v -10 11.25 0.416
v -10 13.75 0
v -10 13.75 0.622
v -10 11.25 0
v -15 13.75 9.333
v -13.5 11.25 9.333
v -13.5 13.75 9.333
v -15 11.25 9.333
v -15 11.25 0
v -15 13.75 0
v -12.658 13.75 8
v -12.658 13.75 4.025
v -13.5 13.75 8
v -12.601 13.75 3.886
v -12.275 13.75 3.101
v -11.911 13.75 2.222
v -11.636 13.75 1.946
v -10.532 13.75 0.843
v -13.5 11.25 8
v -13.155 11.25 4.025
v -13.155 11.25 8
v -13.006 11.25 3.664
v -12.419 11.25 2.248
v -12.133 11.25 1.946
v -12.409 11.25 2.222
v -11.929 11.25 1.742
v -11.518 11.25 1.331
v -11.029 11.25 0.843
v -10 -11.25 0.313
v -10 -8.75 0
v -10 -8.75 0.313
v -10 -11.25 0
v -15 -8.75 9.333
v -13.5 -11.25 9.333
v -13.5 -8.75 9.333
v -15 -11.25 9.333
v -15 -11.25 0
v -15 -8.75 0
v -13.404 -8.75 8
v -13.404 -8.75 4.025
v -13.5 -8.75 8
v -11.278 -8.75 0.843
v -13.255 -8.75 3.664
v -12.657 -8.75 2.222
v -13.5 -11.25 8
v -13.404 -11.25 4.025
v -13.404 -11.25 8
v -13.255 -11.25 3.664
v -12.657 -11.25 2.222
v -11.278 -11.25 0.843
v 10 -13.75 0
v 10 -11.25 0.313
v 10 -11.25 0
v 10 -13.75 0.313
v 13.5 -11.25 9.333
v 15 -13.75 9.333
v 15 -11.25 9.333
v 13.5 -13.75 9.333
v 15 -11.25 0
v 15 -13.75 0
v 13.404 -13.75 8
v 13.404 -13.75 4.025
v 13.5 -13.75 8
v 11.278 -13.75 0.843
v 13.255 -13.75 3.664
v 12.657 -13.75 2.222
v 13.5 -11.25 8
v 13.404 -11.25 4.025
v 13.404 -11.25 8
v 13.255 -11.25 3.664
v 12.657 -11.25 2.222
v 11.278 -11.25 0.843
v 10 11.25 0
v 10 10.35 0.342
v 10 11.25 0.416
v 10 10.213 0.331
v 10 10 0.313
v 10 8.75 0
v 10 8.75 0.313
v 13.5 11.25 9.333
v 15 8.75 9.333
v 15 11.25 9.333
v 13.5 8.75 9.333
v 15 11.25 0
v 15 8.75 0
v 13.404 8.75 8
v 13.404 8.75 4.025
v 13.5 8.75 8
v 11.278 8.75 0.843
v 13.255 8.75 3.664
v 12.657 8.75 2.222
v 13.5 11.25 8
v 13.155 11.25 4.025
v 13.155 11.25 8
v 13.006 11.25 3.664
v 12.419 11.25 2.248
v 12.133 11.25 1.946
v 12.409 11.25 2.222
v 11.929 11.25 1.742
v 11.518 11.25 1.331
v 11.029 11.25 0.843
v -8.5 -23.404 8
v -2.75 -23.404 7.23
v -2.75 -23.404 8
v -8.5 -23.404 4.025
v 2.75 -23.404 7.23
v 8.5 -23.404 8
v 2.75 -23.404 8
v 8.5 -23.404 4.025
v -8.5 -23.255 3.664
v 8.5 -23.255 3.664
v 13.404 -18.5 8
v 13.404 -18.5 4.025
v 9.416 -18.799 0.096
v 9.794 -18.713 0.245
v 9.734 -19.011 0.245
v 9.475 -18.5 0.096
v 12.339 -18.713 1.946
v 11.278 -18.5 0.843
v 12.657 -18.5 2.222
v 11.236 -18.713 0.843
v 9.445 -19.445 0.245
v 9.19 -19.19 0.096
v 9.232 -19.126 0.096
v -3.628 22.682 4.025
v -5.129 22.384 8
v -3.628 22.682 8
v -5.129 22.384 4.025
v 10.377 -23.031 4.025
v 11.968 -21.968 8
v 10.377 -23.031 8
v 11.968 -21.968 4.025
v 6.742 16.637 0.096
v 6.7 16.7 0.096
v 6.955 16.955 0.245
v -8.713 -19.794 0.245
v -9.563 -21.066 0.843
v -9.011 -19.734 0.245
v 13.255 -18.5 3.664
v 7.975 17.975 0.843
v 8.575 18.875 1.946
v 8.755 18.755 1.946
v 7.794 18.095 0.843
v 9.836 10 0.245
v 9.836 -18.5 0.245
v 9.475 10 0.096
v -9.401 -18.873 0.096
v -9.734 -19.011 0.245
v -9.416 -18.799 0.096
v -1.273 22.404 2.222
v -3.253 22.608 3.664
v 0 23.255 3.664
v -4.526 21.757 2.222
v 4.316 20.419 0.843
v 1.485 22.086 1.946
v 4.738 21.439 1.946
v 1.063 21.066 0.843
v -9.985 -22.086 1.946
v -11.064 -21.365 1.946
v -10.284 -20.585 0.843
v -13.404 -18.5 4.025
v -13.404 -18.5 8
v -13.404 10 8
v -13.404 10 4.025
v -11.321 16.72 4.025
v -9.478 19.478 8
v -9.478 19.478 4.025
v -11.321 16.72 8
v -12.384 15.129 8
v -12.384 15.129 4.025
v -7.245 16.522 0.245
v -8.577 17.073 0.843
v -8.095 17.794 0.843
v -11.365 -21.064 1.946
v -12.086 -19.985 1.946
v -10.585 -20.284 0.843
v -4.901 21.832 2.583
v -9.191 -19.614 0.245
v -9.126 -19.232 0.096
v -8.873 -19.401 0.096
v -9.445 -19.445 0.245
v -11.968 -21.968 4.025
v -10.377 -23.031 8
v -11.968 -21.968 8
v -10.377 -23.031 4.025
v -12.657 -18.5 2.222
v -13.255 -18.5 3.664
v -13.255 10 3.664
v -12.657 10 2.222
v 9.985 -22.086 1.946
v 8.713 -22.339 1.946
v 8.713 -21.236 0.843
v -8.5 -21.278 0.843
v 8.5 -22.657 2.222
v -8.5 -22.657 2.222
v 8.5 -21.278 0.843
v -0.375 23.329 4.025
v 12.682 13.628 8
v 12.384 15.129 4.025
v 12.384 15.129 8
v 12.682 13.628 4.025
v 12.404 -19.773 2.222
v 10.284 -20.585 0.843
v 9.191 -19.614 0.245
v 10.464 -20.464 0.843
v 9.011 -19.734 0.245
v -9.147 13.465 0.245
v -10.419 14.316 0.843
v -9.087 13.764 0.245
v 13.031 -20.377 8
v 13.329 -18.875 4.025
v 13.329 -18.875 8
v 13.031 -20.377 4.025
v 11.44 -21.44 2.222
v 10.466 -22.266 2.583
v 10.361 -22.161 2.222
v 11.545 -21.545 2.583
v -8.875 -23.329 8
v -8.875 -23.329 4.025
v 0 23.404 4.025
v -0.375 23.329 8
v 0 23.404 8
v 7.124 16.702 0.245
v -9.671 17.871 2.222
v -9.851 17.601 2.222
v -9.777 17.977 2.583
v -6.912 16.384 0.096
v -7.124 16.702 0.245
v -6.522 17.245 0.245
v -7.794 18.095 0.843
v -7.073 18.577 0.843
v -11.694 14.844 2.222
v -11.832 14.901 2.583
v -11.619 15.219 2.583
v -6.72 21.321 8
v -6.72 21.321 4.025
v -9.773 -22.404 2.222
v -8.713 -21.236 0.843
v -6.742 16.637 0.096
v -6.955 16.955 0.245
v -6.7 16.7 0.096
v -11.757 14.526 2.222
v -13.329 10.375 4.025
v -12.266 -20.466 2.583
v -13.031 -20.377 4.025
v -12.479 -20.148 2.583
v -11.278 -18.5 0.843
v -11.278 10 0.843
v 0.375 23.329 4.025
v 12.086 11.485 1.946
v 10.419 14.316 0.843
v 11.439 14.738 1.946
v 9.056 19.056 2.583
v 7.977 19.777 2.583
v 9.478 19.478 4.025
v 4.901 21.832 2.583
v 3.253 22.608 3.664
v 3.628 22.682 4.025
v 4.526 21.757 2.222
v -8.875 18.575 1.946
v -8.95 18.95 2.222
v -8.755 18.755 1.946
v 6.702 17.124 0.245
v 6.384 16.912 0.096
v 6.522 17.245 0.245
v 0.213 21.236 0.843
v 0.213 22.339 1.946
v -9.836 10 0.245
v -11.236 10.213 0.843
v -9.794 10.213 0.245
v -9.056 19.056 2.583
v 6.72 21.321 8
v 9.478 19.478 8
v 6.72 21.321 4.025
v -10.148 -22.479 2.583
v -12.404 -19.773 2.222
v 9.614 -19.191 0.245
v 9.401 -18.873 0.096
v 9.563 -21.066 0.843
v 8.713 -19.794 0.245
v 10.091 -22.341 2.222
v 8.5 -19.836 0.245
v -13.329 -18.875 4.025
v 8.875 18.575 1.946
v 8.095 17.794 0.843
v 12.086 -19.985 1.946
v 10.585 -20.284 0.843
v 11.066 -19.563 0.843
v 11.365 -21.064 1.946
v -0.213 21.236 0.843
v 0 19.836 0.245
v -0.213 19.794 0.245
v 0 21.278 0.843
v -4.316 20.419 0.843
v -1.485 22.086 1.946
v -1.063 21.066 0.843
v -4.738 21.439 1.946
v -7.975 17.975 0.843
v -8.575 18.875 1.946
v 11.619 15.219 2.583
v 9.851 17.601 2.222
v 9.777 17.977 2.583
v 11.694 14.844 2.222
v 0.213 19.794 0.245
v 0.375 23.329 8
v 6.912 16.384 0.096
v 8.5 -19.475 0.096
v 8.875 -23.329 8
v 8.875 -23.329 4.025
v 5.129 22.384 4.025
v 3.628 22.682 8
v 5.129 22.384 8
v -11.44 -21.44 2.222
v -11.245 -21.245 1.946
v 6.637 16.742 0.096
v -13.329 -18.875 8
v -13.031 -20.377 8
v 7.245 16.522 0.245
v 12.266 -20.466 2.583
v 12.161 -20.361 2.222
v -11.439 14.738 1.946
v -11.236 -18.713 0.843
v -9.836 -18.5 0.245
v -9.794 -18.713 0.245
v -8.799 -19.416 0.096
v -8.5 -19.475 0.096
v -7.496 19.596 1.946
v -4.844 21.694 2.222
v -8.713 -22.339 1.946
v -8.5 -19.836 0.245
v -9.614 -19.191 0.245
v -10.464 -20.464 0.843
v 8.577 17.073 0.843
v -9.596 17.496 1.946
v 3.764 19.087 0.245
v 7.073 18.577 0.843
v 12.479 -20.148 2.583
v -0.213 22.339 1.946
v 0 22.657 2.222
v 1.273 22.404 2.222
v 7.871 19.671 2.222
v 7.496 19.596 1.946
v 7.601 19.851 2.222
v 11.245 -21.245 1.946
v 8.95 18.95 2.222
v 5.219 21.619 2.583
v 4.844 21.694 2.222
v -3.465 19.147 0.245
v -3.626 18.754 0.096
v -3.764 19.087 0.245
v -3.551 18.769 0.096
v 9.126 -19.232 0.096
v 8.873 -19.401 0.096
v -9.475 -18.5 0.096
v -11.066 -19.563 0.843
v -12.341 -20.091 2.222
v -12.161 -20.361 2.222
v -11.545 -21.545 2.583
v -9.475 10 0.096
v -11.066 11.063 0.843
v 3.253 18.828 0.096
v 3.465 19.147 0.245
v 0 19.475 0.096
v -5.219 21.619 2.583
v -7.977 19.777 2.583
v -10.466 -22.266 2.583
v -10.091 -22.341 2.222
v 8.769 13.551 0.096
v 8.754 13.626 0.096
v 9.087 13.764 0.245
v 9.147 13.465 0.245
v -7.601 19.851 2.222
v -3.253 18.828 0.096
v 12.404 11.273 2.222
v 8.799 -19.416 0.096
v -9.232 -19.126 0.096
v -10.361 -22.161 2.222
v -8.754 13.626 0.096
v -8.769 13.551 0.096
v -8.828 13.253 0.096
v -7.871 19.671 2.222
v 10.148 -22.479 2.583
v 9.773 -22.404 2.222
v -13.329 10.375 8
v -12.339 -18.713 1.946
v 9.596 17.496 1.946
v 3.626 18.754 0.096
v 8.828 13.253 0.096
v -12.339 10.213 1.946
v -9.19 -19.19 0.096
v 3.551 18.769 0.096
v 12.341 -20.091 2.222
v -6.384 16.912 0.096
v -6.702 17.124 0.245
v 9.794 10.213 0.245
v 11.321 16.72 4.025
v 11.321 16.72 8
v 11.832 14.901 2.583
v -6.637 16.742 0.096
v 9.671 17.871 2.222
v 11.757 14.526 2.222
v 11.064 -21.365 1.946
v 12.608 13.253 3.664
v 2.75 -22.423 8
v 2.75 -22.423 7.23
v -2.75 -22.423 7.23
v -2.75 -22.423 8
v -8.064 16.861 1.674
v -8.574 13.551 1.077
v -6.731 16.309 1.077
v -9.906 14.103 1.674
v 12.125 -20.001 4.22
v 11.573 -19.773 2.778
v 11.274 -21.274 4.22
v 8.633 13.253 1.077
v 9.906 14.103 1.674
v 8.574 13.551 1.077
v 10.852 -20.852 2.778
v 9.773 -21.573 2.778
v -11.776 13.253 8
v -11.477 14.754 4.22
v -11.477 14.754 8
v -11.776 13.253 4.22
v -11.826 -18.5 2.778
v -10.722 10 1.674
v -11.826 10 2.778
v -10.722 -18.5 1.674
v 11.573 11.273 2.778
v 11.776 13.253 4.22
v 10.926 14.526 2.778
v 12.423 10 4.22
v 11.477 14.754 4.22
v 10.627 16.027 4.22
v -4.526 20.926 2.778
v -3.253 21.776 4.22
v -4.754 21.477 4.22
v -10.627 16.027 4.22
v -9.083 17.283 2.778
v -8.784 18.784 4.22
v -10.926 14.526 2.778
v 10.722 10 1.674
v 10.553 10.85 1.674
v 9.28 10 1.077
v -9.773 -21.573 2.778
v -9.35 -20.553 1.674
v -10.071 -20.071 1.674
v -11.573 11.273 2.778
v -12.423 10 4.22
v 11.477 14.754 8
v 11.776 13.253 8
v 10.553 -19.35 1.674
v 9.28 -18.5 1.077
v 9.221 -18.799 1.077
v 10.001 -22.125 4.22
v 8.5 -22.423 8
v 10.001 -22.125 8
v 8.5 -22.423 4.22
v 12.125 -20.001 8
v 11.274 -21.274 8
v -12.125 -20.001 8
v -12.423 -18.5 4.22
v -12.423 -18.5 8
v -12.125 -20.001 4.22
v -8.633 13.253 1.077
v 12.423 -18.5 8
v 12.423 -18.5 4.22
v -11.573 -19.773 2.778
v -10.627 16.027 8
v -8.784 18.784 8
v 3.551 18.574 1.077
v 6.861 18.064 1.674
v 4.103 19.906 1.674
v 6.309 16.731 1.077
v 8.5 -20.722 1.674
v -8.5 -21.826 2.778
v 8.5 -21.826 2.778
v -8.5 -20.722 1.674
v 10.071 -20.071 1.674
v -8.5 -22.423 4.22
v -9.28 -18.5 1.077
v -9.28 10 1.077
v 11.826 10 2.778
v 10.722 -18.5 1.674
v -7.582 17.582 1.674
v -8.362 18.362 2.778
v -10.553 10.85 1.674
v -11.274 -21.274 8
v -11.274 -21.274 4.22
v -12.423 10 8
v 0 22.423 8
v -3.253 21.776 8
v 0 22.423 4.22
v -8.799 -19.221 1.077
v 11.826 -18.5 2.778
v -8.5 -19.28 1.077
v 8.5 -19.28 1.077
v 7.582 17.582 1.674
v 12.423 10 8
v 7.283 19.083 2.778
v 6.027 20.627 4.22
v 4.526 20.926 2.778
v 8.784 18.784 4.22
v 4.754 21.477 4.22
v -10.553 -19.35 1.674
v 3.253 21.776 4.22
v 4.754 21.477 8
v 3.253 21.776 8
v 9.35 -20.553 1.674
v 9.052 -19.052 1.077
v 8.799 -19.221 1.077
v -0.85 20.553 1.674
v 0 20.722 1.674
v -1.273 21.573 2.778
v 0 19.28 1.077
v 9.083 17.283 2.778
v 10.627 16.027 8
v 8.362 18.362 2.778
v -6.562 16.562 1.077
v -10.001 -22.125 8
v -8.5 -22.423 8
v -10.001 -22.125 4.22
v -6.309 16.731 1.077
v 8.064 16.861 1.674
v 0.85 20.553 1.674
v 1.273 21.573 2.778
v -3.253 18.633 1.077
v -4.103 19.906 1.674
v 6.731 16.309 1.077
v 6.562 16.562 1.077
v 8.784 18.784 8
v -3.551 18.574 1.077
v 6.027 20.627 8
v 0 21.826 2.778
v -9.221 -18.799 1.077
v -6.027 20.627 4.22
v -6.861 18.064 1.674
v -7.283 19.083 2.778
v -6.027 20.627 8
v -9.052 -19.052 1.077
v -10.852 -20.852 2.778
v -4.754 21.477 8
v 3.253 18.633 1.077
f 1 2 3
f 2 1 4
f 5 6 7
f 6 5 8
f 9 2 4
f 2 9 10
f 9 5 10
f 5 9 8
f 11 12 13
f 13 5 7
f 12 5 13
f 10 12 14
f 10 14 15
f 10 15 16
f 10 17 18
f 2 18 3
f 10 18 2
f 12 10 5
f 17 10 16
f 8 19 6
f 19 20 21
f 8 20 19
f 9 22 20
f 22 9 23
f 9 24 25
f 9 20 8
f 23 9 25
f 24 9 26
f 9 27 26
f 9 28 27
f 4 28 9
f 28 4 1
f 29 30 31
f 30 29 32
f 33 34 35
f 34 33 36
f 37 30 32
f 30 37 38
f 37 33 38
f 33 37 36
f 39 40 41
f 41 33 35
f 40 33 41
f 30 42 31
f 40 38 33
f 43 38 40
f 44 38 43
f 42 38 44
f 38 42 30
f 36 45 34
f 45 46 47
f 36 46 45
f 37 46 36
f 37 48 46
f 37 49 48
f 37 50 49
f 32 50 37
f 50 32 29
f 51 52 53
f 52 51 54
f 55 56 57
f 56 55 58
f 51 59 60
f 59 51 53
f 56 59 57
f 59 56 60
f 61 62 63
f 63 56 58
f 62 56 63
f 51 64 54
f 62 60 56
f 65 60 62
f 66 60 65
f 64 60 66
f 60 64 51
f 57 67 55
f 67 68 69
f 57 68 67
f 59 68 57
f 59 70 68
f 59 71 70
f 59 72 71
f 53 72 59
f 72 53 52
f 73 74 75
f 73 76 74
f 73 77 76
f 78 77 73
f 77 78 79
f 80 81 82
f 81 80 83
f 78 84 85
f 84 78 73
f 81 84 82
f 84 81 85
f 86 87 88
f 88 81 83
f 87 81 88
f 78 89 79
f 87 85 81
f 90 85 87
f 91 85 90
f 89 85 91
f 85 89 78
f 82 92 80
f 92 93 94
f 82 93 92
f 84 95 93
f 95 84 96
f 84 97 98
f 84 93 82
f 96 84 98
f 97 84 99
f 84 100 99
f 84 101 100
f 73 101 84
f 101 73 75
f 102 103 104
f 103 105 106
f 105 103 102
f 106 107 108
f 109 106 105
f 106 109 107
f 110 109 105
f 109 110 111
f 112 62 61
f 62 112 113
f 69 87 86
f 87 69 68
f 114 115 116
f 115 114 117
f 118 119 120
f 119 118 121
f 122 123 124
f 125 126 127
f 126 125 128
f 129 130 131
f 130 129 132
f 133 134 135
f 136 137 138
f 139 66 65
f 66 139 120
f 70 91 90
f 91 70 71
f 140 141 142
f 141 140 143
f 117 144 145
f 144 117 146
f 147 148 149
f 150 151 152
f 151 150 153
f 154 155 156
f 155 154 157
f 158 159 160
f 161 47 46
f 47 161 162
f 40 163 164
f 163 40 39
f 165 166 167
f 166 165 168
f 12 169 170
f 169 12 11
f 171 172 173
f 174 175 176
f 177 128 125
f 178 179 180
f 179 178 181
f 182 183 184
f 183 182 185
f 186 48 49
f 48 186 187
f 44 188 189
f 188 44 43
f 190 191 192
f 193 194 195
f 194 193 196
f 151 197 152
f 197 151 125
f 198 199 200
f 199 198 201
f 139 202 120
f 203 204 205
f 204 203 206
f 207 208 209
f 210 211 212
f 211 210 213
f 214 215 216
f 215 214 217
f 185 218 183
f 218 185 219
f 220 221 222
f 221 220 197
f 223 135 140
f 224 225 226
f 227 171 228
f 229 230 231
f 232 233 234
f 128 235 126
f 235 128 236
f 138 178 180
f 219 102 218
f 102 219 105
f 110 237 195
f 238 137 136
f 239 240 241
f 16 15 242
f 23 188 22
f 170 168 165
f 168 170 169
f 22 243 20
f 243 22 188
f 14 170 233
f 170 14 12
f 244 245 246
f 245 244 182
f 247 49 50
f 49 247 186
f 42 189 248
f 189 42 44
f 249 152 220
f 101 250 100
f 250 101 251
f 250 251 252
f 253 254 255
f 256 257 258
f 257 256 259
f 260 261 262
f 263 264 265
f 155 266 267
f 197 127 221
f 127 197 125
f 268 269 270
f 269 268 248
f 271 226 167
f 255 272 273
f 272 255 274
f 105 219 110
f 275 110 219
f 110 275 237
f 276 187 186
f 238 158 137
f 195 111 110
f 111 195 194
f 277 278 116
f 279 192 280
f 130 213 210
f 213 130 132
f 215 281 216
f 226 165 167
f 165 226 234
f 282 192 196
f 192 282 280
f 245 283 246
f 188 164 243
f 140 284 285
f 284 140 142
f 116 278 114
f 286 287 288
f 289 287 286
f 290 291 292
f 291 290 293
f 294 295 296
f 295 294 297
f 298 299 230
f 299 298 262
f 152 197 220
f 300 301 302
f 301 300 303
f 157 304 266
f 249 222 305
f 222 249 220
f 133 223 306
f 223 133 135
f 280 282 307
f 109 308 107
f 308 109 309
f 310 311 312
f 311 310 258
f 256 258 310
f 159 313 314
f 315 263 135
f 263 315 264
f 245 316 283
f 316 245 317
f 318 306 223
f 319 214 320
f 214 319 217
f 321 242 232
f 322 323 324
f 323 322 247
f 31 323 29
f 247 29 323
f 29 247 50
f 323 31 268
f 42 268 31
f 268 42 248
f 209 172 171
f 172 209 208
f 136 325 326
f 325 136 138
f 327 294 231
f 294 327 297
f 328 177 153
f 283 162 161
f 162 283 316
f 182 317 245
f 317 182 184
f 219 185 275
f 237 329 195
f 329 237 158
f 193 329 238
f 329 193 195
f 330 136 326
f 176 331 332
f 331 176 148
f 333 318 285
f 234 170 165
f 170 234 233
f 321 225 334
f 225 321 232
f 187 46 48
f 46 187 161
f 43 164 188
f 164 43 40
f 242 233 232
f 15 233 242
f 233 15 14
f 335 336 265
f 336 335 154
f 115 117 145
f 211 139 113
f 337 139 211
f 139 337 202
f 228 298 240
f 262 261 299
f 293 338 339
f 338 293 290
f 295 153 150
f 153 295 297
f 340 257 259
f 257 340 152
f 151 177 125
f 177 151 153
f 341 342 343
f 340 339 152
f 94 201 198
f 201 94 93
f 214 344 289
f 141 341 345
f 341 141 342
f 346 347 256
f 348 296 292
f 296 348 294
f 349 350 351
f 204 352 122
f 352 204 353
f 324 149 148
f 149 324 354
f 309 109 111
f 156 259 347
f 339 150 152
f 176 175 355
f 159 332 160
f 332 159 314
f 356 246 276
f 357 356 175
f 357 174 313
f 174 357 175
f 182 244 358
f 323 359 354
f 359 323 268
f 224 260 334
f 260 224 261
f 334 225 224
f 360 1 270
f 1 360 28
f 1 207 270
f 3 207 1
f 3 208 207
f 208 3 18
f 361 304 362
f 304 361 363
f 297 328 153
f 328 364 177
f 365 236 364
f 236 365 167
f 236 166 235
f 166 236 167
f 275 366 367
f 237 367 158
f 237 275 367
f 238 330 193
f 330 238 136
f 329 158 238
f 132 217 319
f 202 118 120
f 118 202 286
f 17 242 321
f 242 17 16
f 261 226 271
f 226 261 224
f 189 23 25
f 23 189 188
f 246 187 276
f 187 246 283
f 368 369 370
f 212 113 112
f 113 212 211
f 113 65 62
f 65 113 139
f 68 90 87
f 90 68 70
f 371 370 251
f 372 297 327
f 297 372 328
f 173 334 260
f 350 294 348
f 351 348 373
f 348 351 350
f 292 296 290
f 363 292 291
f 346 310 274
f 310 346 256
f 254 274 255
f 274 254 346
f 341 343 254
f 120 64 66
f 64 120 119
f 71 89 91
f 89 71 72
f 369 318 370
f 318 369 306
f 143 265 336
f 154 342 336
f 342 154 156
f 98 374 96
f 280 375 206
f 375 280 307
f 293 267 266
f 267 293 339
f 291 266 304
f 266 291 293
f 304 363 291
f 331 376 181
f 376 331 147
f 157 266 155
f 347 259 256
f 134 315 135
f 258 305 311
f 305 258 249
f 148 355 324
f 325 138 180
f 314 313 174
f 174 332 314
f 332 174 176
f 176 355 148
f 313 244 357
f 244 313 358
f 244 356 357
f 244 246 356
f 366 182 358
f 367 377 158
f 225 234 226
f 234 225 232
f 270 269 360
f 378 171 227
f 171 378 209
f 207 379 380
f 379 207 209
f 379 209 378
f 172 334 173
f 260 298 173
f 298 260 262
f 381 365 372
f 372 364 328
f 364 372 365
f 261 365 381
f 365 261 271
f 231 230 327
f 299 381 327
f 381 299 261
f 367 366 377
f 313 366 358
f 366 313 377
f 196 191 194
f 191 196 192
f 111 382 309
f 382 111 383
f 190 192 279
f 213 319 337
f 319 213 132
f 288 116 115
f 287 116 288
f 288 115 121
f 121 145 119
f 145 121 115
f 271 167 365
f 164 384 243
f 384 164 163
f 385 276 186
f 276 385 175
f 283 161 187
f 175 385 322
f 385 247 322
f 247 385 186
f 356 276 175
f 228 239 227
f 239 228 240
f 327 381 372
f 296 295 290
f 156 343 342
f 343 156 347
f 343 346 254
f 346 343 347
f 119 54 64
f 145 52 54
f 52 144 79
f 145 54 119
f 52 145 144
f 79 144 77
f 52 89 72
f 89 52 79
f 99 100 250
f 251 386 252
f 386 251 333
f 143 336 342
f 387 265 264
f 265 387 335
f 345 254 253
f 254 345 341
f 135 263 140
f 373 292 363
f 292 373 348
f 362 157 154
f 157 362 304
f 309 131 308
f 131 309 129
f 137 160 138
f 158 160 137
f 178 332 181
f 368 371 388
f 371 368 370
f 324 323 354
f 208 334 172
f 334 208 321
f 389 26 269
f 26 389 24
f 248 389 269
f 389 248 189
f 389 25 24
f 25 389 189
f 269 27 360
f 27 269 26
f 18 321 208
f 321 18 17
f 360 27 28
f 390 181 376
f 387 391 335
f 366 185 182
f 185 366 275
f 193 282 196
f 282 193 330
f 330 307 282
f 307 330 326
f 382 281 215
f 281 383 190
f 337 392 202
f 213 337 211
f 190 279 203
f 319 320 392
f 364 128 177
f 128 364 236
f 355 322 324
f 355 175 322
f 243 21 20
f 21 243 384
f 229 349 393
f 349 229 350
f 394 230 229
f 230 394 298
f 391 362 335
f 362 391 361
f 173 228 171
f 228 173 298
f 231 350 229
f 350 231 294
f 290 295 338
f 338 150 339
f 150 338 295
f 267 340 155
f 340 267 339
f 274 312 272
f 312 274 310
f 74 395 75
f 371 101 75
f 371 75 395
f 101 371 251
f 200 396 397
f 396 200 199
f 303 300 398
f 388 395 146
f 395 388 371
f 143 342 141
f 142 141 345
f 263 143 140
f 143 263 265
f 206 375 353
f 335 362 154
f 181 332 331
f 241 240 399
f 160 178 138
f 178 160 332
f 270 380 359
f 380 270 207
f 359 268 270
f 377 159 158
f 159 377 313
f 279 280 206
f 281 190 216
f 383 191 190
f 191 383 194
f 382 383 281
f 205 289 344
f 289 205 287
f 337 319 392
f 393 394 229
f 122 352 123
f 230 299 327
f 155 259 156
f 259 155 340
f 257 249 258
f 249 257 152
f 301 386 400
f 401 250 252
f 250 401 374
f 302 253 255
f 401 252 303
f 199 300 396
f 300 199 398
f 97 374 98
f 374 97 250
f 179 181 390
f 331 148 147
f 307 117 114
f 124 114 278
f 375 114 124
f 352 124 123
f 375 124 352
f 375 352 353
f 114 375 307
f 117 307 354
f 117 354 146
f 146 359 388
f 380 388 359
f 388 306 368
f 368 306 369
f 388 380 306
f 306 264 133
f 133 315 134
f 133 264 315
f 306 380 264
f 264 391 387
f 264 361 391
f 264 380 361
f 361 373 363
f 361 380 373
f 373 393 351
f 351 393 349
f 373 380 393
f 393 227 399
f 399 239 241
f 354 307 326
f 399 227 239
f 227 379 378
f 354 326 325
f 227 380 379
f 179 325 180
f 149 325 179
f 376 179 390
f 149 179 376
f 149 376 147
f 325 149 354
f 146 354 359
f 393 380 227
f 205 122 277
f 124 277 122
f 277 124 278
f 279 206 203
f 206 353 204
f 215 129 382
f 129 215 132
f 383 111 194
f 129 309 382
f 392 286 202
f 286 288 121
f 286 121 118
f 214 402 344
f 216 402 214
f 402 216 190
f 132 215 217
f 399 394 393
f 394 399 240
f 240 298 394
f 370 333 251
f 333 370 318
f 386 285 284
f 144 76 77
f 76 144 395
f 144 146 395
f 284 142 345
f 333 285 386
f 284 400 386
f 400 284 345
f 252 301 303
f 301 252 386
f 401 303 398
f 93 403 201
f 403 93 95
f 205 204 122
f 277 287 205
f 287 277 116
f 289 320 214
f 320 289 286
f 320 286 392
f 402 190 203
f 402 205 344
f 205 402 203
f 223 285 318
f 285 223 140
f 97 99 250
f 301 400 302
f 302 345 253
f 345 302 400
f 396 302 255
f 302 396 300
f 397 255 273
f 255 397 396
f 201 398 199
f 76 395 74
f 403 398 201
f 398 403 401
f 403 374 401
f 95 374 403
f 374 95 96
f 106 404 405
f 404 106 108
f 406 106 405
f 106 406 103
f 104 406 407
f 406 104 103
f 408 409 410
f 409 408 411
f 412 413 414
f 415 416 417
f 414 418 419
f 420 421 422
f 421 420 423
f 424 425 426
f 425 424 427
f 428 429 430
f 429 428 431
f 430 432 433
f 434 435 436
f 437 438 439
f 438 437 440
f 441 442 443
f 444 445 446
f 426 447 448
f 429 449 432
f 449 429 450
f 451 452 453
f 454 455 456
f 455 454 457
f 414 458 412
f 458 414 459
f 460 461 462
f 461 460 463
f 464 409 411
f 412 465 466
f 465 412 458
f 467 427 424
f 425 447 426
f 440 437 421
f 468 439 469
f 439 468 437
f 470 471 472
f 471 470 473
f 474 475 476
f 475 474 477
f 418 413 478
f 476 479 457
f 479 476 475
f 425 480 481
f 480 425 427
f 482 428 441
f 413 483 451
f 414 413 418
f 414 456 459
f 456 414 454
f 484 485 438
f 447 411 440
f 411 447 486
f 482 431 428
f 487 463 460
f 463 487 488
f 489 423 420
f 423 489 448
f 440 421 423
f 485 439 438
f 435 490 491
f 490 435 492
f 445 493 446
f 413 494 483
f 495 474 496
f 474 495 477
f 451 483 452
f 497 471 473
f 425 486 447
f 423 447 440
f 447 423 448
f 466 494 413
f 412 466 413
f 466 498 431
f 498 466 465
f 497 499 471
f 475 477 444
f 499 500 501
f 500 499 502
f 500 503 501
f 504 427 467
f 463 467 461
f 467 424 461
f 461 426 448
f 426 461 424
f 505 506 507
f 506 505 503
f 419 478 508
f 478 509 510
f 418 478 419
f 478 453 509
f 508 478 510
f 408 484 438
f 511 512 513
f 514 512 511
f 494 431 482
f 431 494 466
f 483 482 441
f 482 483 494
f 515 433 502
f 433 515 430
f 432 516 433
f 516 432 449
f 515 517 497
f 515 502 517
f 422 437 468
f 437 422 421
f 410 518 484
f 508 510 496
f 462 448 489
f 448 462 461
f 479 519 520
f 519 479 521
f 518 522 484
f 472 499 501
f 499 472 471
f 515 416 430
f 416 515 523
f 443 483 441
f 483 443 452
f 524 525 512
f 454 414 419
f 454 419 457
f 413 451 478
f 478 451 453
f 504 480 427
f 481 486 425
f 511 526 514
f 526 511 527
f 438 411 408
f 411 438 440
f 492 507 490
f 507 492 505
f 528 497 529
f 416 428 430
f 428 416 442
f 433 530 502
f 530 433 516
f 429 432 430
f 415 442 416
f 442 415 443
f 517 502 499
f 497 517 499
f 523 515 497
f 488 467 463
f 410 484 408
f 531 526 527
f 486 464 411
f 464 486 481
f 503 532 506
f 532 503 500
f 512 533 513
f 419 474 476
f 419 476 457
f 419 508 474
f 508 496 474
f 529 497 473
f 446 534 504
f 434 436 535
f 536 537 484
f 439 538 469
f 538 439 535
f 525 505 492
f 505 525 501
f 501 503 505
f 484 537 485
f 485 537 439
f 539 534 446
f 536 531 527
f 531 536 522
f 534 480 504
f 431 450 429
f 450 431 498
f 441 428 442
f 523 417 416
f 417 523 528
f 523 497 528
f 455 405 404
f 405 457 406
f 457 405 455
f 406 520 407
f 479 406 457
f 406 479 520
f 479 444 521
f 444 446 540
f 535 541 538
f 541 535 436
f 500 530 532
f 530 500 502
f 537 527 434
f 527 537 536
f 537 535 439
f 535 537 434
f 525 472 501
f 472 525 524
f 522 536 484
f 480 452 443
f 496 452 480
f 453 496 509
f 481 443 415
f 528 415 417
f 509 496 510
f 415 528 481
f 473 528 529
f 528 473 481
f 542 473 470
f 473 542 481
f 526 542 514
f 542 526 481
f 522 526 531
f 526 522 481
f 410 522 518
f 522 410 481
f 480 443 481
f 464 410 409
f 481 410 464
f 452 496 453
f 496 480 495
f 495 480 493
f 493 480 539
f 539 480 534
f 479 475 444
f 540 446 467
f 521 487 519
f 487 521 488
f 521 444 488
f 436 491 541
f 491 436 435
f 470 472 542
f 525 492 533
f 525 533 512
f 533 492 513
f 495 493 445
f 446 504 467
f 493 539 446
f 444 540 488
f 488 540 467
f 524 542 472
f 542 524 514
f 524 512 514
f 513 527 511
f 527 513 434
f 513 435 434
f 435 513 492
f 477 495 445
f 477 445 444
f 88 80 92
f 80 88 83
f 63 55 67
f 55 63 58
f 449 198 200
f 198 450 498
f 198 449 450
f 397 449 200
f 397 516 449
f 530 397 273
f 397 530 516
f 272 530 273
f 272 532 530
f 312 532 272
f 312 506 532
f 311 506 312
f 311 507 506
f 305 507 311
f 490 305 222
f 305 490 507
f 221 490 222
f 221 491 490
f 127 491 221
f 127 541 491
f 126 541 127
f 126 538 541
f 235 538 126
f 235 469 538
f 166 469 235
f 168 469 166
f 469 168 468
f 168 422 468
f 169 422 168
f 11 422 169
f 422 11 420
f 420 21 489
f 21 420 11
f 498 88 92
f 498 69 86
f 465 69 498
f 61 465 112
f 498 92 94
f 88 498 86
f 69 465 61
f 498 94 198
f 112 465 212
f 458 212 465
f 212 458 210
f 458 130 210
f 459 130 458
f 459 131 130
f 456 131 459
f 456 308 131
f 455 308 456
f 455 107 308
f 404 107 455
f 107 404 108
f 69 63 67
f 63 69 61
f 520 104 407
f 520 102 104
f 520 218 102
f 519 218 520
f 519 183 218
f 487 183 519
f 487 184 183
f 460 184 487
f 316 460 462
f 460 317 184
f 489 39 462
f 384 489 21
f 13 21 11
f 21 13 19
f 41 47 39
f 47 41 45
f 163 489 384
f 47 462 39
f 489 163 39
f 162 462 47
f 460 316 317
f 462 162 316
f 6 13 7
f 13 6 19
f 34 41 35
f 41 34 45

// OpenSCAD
// file: zcube.scad
// This function creates a cube with a given x/y either above (f=1) or below (f=-1) the z axis.
module zcube(dimensions, z=0, f=1) {
	translate([0, 0, dimensions[2]/2 * f + z]) cube(dimensions, true);
}
// main file
use <zcube.scad>;

popsicle_bevel = 4;
popsicle_size = [25, 45, 14];
$fn = 16;

module diamond(size = bevel_size) {
	render() polyhedron(
		points=[
			// Outside points:
			[size,size,0],[size,-size,0],[-size,-size,0],[-size,size,0],
			// Apex points:
			[0,0,size],[0,0,-size]
		],
		faces=[
			// Top faces:
			[0,1,4],[1,2,4],[2,3,4],[3,0,4],
			// Bottom faces:
			[0,1,5],[1,2,5],[2,3,5],[3,0,5],
		]
	);
}

module popsicle(size = popsicle_size, bevel = popsicle_bevel) {
	inset_size = size - [bevel*2, bevel*2, bevel*2];
	
	cube_size = [
		inset_size[0],
		inset_size[1] - inset_size[0]/2,
		inset_size[2]
	];
	
	minkowski() {
		translate([0, -cube_size[0]/4, -cube_size[2]/2]) union() {
			zcube(cube_size);
			translate([0, cube_size[1]/2, 0]) cylinder(r=cube_size[0]/2, h=size[2]-bevel*2);
		}
		sphere(r=bevel,$fn=16);
	}
	
	//%cube(size, center=true);
}

module slots(size, r=5) {
	offset = size[1]/4;
	
	translate([-size[0]/2, offset+r/4, 0]) zcube([r, r/2, size[2]/1.5], z=-size[2]/2);
	translate([-size[0]/2, -offset+r/4, 0]) zcube([r, r/2, size[2]/1.5], z=-size[2]/2);
}

module shell(size = popsicle_size, thickness = 1) {
	translate([0, 0, size[2]/2]) difference() {
		union() { 
			translate([0, 0, thickness]) minkowski() {
				popsicle(size);
				sphere(r=thickness,$fn=16);
			}
			
			slots(size);
			rotate([0, 0, 180]) slots(size);
		}
		
		translate([0, 0, thickness]) {
			popsicle(size);
			zcube(size+[2, 2, 0]);
			scale(1.1) stick();
		}
	}
}

module stick(size = popsicle_size) {
	stick_size = [size[0]/5, size[1]*0.6, size[2]/10];
	translate([0, -size[1]/2, 0]) {
		cube(stick_size, center=true);
		translate([0, stick_size[1]/2, -stick_size[2]/2]) cylinder(r=stick_size[0]/2, h=stick_size[2]);
		translate([0, -stick_size[1]/2, -stick_size[2]/2]) cylinder(r=stick_size[0]/2, h=stick_size[2]);
	}
}

shell();
//popsicle();
